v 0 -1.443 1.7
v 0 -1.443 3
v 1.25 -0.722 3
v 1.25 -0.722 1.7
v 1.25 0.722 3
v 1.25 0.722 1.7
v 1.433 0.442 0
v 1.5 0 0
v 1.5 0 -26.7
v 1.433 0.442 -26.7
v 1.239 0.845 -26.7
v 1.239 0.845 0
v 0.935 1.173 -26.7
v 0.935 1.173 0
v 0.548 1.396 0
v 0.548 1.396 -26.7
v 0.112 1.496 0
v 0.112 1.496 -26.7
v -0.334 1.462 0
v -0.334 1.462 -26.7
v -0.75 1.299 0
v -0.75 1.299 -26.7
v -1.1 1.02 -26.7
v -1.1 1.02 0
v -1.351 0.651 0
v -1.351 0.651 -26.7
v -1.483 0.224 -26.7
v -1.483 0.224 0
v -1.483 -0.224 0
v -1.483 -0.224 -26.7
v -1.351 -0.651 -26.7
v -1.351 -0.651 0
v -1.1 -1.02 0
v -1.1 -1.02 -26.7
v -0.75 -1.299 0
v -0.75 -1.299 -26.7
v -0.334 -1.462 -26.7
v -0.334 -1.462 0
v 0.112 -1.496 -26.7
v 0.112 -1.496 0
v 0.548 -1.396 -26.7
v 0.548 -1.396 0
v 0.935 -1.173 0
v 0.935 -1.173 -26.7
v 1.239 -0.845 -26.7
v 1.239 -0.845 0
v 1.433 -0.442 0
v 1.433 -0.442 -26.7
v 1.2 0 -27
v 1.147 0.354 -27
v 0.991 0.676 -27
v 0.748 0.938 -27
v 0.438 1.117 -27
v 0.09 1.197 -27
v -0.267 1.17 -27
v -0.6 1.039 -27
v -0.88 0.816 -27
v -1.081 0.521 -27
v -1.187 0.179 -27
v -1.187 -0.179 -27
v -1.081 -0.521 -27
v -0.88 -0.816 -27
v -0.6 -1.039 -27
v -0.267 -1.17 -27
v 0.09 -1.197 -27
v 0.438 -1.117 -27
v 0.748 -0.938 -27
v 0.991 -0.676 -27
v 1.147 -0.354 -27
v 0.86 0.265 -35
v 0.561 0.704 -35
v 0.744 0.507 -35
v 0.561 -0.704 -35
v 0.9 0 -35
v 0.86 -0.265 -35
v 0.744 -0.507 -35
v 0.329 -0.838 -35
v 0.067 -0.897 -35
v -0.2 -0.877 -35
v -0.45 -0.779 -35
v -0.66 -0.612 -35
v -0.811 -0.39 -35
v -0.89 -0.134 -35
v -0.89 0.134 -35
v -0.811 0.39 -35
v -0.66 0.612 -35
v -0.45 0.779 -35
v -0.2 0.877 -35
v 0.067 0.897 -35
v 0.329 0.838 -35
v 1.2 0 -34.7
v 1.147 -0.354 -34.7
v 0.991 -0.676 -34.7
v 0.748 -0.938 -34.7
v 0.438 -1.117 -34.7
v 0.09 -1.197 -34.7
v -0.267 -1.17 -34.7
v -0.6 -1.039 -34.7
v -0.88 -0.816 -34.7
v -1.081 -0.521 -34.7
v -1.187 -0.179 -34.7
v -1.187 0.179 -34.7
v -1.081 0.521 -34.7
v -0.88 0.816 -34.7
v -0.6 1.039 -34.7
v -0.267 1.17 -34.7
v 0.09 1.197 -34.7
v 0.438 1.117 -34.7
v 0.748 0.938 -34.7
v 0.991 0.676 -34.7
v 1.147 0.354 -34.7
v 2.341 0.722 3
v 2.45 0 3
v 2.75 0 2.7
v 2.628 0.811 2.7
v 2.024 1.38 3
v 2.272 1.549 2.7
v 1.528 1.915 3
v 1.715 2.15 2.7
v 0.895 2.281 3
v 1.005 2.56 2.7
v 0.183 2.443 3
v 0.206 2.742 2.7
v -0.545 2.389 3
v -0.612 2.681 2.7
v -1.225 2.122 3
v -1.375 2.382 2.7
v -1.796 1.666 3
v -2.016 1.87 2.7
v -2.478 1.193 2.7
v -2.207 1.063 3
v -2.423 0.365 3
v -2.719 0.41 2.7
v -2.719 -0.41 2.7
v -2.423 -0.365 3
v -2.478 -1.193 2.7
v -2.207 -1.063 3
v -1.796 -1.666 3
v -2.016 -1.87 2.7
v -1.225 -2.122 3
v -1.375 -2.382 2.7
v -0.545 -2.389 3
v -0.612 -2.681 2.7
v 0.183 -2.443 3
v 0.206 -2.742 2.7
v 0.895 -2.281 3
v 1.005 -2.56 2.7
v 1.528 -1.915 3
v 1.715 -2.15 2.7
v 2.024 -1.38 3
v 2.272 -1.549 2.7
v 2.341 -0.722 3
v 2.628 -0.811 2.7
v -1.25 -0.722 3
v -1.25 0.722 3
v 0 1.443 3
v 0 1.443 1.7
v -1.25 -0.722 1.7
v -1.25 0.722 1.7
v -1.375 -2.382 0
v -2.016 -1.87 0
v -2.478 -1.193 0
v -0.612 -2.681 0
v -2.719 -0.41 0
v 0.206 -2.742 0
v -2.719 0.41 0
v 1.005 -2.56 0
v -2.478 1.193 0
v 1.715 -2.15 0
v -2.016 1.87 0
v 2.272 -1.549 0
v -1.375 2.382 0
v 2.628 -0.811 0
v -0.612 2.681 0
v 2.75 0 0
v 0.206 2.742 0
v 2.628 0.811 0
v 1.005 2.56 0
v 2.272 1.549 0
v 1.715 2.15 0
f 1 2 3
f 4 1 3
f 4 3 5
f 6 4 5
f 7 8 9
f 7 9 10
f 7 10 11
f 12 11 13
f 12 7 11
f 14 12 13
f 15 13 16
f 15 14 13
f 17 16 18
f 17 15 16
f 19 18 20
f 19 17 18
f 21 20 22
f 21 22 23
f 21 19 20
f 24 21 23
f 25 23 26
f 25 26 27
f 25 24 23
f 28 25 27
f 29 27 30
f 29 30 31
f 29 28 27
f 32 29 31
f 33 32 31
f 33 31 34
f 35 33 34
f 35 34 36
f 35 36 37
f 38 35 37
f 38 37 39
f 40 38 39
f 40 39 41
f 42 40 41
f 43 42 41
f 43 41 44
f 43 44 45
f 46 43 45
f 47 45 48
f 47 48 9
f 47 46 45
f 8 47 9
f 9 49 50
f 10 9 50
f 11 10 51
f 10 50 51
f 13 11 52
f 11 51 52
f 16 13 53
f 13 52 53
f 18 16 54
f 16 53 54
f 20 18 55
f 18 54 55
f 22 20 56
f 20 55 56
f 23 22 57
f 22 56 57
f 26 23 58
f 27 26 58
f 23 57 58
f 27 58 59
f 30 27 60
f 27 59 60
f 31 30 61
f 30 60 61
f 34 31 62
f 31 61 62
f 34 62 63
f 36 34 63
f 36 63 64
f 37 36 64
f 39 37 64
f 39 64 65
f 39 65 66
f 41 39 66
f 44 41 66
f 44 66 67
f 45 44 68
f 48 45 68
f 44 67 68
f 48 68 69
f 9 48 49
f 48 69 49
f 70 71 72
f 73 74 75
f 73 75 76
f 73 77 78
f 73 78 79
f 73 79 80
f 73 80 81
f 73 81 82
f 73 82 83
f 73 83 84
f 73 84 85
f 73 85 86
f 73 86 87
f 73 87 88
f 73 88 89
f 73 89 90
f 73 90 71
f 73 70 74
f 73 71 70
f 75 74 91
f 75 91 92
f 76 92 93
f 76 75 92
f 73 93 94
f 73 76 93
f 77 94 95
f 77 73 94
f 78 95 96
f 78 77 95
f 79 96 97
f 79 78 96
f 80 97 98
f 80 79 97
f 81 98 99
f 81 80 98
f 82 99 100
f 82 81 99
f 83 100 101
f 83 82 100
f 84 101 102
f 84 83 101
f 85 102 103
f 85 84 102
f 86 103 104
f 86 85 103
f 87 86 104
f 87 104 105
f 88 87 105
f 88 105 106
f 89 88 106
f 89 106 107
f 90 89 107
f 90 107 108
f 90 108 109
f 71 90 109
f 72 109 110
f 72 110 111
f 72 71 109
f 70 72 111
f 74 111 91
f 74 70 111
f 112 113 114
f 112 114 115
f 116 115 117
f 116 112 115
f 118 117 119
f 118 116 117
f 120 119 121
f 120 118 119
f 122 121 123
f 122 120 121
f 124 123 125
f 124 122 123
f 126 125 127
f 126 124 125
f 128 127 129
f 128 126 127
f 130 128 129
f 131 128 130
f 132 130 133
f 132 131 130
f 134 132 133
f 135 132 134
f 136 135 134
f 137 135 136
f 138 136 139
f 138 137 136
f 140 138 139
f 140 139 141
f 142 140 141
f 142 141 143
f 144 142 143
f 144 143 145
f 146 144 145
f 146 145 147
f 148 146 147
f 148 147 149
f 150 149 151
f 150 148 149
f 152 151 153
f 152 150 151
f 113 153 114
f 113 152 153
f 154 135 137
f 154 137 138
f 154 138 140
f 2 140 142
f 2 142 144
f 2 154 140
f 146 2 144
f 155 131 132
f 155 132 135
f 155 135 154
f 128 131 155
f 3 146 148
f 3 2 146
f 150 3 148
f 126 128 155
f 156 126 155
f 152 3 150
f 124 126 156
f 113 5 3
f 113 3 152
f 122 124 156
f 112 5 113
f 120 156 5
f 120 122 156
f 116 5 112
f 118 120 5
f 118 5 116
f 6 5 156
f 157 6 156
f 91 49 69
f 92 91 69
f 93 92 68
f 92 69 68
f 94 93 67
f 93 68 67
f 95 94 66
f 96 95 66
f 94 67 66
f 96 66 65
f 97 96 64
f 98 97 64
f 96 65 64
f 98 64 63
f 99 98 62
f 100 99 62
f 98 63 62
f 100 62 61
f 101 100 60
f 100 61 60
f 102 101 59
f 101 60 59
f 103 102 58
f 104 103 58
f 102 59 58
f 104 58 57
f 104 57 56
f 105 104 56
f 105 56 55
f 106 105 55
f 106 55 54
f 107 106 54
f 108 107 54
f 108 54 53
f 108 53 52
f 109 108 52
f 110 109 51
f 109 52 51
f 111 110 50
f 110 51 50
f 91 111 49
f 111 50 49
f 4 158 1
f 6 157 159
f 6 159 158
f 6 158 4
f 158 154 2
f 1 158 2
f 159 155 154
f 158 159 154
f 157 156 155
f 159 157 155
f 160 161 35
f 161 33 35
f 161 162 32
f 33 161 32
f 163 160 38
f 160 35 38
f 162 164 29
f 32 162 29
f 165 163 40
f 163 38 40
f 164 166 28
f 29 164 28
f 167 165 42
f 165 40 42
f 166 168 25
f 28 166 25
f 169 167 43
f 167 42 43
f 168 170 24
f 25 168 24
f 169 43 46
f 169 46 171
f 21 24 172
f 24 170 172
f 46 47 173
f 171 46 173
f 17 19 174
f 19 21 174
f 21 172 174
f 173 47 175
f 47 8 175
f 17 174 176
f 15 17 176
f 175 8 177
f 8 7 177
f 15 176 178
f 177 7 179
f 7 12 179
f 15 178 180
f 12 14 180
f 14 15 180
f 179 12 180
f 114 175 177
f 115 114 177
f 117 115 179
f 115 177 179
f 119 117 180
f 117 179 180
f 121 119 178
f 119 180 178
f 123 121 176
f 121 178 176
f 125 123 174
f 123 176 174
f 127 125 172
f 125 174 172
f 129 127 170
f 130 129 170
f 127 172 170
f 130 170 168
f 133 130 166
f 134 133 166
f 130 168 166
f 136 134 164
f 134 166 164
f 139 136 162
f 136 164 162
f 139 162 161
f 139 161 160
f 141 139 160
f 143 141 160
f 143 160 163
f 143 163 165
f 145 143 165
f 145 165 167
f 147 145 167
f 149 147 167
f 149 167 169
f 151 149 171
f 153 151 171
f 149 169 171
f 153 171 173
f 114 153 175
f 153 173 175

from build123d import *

# Parameters (mm, degrees)
F3_R       = 1.5
F4_DEPTH   = 27
F5_R       = 1.2
F6_DEPTH   = 8
F3_R_2     = 2.75
F4_FACE1_R = 1.5
F7_DEPTH   = 3
F8_SIZE    = 0.29999
F10_DEPTH  = 1.3


# Not quite as in the source:
# - a fillet or chamfer is up to 0.001 mm smaller than in the source, because OpenCascade refuses the exact size


with BuildPart() as f4:
    # F3 (on Top) → F4 (new body)
    with BuildSketch(Plane.XY):
        Circle(F3_R)
    extrude(amount=-F4_DEPTH)

    # F5 (on face) → F6 (join)
    with BuildSketch(Plane(origin=(0, 0, -27), x_dir=(1, 0, 0), z_dir=(0, 0, -1))):
        Circle(F5_R)
    extrude(amount=F6_DEPTH)

    # F3 (on Top) + F4_face1 (on face) → F7 (join)
    with BuildSketch(Plane.XY):
        Circle(F3_R_2)
        Circle(F3_R, mode=Mode.SUBTRACT)
    with BuildSketch(Plane.XY):
        Circle(F4_FACE1_R)
    extrude(amount=F7_DEPTH)

    # F8 (size 0.3 in the source; OpenCascade refuses exactly that, so slightly less here)
    f8_edges = [f4.edges().sort_by_distance(p)[0] for p in [
        (-1.5, 0, -27),
        (-2.75, 0, 3),
        (-1.2, 0, -35),
    ]]
    chamfer(f8_edges, length=F8_SIZE)

    # F9 (on face) → F10 (cut)
    with BuildSketch(Plane.XY.offset(3)):
        Polygon((1.25, -0.7216878365), (1.25, 0.7216878365), (0, 1.443375673), (-1.25, 0.7216878365), (-1.25, -0.7216878365), (0, -1.443375673), align=None)
    extrude(amount=-F10_DEPTH, mode=Mode.SUBTRACT)


solid = f4.part
